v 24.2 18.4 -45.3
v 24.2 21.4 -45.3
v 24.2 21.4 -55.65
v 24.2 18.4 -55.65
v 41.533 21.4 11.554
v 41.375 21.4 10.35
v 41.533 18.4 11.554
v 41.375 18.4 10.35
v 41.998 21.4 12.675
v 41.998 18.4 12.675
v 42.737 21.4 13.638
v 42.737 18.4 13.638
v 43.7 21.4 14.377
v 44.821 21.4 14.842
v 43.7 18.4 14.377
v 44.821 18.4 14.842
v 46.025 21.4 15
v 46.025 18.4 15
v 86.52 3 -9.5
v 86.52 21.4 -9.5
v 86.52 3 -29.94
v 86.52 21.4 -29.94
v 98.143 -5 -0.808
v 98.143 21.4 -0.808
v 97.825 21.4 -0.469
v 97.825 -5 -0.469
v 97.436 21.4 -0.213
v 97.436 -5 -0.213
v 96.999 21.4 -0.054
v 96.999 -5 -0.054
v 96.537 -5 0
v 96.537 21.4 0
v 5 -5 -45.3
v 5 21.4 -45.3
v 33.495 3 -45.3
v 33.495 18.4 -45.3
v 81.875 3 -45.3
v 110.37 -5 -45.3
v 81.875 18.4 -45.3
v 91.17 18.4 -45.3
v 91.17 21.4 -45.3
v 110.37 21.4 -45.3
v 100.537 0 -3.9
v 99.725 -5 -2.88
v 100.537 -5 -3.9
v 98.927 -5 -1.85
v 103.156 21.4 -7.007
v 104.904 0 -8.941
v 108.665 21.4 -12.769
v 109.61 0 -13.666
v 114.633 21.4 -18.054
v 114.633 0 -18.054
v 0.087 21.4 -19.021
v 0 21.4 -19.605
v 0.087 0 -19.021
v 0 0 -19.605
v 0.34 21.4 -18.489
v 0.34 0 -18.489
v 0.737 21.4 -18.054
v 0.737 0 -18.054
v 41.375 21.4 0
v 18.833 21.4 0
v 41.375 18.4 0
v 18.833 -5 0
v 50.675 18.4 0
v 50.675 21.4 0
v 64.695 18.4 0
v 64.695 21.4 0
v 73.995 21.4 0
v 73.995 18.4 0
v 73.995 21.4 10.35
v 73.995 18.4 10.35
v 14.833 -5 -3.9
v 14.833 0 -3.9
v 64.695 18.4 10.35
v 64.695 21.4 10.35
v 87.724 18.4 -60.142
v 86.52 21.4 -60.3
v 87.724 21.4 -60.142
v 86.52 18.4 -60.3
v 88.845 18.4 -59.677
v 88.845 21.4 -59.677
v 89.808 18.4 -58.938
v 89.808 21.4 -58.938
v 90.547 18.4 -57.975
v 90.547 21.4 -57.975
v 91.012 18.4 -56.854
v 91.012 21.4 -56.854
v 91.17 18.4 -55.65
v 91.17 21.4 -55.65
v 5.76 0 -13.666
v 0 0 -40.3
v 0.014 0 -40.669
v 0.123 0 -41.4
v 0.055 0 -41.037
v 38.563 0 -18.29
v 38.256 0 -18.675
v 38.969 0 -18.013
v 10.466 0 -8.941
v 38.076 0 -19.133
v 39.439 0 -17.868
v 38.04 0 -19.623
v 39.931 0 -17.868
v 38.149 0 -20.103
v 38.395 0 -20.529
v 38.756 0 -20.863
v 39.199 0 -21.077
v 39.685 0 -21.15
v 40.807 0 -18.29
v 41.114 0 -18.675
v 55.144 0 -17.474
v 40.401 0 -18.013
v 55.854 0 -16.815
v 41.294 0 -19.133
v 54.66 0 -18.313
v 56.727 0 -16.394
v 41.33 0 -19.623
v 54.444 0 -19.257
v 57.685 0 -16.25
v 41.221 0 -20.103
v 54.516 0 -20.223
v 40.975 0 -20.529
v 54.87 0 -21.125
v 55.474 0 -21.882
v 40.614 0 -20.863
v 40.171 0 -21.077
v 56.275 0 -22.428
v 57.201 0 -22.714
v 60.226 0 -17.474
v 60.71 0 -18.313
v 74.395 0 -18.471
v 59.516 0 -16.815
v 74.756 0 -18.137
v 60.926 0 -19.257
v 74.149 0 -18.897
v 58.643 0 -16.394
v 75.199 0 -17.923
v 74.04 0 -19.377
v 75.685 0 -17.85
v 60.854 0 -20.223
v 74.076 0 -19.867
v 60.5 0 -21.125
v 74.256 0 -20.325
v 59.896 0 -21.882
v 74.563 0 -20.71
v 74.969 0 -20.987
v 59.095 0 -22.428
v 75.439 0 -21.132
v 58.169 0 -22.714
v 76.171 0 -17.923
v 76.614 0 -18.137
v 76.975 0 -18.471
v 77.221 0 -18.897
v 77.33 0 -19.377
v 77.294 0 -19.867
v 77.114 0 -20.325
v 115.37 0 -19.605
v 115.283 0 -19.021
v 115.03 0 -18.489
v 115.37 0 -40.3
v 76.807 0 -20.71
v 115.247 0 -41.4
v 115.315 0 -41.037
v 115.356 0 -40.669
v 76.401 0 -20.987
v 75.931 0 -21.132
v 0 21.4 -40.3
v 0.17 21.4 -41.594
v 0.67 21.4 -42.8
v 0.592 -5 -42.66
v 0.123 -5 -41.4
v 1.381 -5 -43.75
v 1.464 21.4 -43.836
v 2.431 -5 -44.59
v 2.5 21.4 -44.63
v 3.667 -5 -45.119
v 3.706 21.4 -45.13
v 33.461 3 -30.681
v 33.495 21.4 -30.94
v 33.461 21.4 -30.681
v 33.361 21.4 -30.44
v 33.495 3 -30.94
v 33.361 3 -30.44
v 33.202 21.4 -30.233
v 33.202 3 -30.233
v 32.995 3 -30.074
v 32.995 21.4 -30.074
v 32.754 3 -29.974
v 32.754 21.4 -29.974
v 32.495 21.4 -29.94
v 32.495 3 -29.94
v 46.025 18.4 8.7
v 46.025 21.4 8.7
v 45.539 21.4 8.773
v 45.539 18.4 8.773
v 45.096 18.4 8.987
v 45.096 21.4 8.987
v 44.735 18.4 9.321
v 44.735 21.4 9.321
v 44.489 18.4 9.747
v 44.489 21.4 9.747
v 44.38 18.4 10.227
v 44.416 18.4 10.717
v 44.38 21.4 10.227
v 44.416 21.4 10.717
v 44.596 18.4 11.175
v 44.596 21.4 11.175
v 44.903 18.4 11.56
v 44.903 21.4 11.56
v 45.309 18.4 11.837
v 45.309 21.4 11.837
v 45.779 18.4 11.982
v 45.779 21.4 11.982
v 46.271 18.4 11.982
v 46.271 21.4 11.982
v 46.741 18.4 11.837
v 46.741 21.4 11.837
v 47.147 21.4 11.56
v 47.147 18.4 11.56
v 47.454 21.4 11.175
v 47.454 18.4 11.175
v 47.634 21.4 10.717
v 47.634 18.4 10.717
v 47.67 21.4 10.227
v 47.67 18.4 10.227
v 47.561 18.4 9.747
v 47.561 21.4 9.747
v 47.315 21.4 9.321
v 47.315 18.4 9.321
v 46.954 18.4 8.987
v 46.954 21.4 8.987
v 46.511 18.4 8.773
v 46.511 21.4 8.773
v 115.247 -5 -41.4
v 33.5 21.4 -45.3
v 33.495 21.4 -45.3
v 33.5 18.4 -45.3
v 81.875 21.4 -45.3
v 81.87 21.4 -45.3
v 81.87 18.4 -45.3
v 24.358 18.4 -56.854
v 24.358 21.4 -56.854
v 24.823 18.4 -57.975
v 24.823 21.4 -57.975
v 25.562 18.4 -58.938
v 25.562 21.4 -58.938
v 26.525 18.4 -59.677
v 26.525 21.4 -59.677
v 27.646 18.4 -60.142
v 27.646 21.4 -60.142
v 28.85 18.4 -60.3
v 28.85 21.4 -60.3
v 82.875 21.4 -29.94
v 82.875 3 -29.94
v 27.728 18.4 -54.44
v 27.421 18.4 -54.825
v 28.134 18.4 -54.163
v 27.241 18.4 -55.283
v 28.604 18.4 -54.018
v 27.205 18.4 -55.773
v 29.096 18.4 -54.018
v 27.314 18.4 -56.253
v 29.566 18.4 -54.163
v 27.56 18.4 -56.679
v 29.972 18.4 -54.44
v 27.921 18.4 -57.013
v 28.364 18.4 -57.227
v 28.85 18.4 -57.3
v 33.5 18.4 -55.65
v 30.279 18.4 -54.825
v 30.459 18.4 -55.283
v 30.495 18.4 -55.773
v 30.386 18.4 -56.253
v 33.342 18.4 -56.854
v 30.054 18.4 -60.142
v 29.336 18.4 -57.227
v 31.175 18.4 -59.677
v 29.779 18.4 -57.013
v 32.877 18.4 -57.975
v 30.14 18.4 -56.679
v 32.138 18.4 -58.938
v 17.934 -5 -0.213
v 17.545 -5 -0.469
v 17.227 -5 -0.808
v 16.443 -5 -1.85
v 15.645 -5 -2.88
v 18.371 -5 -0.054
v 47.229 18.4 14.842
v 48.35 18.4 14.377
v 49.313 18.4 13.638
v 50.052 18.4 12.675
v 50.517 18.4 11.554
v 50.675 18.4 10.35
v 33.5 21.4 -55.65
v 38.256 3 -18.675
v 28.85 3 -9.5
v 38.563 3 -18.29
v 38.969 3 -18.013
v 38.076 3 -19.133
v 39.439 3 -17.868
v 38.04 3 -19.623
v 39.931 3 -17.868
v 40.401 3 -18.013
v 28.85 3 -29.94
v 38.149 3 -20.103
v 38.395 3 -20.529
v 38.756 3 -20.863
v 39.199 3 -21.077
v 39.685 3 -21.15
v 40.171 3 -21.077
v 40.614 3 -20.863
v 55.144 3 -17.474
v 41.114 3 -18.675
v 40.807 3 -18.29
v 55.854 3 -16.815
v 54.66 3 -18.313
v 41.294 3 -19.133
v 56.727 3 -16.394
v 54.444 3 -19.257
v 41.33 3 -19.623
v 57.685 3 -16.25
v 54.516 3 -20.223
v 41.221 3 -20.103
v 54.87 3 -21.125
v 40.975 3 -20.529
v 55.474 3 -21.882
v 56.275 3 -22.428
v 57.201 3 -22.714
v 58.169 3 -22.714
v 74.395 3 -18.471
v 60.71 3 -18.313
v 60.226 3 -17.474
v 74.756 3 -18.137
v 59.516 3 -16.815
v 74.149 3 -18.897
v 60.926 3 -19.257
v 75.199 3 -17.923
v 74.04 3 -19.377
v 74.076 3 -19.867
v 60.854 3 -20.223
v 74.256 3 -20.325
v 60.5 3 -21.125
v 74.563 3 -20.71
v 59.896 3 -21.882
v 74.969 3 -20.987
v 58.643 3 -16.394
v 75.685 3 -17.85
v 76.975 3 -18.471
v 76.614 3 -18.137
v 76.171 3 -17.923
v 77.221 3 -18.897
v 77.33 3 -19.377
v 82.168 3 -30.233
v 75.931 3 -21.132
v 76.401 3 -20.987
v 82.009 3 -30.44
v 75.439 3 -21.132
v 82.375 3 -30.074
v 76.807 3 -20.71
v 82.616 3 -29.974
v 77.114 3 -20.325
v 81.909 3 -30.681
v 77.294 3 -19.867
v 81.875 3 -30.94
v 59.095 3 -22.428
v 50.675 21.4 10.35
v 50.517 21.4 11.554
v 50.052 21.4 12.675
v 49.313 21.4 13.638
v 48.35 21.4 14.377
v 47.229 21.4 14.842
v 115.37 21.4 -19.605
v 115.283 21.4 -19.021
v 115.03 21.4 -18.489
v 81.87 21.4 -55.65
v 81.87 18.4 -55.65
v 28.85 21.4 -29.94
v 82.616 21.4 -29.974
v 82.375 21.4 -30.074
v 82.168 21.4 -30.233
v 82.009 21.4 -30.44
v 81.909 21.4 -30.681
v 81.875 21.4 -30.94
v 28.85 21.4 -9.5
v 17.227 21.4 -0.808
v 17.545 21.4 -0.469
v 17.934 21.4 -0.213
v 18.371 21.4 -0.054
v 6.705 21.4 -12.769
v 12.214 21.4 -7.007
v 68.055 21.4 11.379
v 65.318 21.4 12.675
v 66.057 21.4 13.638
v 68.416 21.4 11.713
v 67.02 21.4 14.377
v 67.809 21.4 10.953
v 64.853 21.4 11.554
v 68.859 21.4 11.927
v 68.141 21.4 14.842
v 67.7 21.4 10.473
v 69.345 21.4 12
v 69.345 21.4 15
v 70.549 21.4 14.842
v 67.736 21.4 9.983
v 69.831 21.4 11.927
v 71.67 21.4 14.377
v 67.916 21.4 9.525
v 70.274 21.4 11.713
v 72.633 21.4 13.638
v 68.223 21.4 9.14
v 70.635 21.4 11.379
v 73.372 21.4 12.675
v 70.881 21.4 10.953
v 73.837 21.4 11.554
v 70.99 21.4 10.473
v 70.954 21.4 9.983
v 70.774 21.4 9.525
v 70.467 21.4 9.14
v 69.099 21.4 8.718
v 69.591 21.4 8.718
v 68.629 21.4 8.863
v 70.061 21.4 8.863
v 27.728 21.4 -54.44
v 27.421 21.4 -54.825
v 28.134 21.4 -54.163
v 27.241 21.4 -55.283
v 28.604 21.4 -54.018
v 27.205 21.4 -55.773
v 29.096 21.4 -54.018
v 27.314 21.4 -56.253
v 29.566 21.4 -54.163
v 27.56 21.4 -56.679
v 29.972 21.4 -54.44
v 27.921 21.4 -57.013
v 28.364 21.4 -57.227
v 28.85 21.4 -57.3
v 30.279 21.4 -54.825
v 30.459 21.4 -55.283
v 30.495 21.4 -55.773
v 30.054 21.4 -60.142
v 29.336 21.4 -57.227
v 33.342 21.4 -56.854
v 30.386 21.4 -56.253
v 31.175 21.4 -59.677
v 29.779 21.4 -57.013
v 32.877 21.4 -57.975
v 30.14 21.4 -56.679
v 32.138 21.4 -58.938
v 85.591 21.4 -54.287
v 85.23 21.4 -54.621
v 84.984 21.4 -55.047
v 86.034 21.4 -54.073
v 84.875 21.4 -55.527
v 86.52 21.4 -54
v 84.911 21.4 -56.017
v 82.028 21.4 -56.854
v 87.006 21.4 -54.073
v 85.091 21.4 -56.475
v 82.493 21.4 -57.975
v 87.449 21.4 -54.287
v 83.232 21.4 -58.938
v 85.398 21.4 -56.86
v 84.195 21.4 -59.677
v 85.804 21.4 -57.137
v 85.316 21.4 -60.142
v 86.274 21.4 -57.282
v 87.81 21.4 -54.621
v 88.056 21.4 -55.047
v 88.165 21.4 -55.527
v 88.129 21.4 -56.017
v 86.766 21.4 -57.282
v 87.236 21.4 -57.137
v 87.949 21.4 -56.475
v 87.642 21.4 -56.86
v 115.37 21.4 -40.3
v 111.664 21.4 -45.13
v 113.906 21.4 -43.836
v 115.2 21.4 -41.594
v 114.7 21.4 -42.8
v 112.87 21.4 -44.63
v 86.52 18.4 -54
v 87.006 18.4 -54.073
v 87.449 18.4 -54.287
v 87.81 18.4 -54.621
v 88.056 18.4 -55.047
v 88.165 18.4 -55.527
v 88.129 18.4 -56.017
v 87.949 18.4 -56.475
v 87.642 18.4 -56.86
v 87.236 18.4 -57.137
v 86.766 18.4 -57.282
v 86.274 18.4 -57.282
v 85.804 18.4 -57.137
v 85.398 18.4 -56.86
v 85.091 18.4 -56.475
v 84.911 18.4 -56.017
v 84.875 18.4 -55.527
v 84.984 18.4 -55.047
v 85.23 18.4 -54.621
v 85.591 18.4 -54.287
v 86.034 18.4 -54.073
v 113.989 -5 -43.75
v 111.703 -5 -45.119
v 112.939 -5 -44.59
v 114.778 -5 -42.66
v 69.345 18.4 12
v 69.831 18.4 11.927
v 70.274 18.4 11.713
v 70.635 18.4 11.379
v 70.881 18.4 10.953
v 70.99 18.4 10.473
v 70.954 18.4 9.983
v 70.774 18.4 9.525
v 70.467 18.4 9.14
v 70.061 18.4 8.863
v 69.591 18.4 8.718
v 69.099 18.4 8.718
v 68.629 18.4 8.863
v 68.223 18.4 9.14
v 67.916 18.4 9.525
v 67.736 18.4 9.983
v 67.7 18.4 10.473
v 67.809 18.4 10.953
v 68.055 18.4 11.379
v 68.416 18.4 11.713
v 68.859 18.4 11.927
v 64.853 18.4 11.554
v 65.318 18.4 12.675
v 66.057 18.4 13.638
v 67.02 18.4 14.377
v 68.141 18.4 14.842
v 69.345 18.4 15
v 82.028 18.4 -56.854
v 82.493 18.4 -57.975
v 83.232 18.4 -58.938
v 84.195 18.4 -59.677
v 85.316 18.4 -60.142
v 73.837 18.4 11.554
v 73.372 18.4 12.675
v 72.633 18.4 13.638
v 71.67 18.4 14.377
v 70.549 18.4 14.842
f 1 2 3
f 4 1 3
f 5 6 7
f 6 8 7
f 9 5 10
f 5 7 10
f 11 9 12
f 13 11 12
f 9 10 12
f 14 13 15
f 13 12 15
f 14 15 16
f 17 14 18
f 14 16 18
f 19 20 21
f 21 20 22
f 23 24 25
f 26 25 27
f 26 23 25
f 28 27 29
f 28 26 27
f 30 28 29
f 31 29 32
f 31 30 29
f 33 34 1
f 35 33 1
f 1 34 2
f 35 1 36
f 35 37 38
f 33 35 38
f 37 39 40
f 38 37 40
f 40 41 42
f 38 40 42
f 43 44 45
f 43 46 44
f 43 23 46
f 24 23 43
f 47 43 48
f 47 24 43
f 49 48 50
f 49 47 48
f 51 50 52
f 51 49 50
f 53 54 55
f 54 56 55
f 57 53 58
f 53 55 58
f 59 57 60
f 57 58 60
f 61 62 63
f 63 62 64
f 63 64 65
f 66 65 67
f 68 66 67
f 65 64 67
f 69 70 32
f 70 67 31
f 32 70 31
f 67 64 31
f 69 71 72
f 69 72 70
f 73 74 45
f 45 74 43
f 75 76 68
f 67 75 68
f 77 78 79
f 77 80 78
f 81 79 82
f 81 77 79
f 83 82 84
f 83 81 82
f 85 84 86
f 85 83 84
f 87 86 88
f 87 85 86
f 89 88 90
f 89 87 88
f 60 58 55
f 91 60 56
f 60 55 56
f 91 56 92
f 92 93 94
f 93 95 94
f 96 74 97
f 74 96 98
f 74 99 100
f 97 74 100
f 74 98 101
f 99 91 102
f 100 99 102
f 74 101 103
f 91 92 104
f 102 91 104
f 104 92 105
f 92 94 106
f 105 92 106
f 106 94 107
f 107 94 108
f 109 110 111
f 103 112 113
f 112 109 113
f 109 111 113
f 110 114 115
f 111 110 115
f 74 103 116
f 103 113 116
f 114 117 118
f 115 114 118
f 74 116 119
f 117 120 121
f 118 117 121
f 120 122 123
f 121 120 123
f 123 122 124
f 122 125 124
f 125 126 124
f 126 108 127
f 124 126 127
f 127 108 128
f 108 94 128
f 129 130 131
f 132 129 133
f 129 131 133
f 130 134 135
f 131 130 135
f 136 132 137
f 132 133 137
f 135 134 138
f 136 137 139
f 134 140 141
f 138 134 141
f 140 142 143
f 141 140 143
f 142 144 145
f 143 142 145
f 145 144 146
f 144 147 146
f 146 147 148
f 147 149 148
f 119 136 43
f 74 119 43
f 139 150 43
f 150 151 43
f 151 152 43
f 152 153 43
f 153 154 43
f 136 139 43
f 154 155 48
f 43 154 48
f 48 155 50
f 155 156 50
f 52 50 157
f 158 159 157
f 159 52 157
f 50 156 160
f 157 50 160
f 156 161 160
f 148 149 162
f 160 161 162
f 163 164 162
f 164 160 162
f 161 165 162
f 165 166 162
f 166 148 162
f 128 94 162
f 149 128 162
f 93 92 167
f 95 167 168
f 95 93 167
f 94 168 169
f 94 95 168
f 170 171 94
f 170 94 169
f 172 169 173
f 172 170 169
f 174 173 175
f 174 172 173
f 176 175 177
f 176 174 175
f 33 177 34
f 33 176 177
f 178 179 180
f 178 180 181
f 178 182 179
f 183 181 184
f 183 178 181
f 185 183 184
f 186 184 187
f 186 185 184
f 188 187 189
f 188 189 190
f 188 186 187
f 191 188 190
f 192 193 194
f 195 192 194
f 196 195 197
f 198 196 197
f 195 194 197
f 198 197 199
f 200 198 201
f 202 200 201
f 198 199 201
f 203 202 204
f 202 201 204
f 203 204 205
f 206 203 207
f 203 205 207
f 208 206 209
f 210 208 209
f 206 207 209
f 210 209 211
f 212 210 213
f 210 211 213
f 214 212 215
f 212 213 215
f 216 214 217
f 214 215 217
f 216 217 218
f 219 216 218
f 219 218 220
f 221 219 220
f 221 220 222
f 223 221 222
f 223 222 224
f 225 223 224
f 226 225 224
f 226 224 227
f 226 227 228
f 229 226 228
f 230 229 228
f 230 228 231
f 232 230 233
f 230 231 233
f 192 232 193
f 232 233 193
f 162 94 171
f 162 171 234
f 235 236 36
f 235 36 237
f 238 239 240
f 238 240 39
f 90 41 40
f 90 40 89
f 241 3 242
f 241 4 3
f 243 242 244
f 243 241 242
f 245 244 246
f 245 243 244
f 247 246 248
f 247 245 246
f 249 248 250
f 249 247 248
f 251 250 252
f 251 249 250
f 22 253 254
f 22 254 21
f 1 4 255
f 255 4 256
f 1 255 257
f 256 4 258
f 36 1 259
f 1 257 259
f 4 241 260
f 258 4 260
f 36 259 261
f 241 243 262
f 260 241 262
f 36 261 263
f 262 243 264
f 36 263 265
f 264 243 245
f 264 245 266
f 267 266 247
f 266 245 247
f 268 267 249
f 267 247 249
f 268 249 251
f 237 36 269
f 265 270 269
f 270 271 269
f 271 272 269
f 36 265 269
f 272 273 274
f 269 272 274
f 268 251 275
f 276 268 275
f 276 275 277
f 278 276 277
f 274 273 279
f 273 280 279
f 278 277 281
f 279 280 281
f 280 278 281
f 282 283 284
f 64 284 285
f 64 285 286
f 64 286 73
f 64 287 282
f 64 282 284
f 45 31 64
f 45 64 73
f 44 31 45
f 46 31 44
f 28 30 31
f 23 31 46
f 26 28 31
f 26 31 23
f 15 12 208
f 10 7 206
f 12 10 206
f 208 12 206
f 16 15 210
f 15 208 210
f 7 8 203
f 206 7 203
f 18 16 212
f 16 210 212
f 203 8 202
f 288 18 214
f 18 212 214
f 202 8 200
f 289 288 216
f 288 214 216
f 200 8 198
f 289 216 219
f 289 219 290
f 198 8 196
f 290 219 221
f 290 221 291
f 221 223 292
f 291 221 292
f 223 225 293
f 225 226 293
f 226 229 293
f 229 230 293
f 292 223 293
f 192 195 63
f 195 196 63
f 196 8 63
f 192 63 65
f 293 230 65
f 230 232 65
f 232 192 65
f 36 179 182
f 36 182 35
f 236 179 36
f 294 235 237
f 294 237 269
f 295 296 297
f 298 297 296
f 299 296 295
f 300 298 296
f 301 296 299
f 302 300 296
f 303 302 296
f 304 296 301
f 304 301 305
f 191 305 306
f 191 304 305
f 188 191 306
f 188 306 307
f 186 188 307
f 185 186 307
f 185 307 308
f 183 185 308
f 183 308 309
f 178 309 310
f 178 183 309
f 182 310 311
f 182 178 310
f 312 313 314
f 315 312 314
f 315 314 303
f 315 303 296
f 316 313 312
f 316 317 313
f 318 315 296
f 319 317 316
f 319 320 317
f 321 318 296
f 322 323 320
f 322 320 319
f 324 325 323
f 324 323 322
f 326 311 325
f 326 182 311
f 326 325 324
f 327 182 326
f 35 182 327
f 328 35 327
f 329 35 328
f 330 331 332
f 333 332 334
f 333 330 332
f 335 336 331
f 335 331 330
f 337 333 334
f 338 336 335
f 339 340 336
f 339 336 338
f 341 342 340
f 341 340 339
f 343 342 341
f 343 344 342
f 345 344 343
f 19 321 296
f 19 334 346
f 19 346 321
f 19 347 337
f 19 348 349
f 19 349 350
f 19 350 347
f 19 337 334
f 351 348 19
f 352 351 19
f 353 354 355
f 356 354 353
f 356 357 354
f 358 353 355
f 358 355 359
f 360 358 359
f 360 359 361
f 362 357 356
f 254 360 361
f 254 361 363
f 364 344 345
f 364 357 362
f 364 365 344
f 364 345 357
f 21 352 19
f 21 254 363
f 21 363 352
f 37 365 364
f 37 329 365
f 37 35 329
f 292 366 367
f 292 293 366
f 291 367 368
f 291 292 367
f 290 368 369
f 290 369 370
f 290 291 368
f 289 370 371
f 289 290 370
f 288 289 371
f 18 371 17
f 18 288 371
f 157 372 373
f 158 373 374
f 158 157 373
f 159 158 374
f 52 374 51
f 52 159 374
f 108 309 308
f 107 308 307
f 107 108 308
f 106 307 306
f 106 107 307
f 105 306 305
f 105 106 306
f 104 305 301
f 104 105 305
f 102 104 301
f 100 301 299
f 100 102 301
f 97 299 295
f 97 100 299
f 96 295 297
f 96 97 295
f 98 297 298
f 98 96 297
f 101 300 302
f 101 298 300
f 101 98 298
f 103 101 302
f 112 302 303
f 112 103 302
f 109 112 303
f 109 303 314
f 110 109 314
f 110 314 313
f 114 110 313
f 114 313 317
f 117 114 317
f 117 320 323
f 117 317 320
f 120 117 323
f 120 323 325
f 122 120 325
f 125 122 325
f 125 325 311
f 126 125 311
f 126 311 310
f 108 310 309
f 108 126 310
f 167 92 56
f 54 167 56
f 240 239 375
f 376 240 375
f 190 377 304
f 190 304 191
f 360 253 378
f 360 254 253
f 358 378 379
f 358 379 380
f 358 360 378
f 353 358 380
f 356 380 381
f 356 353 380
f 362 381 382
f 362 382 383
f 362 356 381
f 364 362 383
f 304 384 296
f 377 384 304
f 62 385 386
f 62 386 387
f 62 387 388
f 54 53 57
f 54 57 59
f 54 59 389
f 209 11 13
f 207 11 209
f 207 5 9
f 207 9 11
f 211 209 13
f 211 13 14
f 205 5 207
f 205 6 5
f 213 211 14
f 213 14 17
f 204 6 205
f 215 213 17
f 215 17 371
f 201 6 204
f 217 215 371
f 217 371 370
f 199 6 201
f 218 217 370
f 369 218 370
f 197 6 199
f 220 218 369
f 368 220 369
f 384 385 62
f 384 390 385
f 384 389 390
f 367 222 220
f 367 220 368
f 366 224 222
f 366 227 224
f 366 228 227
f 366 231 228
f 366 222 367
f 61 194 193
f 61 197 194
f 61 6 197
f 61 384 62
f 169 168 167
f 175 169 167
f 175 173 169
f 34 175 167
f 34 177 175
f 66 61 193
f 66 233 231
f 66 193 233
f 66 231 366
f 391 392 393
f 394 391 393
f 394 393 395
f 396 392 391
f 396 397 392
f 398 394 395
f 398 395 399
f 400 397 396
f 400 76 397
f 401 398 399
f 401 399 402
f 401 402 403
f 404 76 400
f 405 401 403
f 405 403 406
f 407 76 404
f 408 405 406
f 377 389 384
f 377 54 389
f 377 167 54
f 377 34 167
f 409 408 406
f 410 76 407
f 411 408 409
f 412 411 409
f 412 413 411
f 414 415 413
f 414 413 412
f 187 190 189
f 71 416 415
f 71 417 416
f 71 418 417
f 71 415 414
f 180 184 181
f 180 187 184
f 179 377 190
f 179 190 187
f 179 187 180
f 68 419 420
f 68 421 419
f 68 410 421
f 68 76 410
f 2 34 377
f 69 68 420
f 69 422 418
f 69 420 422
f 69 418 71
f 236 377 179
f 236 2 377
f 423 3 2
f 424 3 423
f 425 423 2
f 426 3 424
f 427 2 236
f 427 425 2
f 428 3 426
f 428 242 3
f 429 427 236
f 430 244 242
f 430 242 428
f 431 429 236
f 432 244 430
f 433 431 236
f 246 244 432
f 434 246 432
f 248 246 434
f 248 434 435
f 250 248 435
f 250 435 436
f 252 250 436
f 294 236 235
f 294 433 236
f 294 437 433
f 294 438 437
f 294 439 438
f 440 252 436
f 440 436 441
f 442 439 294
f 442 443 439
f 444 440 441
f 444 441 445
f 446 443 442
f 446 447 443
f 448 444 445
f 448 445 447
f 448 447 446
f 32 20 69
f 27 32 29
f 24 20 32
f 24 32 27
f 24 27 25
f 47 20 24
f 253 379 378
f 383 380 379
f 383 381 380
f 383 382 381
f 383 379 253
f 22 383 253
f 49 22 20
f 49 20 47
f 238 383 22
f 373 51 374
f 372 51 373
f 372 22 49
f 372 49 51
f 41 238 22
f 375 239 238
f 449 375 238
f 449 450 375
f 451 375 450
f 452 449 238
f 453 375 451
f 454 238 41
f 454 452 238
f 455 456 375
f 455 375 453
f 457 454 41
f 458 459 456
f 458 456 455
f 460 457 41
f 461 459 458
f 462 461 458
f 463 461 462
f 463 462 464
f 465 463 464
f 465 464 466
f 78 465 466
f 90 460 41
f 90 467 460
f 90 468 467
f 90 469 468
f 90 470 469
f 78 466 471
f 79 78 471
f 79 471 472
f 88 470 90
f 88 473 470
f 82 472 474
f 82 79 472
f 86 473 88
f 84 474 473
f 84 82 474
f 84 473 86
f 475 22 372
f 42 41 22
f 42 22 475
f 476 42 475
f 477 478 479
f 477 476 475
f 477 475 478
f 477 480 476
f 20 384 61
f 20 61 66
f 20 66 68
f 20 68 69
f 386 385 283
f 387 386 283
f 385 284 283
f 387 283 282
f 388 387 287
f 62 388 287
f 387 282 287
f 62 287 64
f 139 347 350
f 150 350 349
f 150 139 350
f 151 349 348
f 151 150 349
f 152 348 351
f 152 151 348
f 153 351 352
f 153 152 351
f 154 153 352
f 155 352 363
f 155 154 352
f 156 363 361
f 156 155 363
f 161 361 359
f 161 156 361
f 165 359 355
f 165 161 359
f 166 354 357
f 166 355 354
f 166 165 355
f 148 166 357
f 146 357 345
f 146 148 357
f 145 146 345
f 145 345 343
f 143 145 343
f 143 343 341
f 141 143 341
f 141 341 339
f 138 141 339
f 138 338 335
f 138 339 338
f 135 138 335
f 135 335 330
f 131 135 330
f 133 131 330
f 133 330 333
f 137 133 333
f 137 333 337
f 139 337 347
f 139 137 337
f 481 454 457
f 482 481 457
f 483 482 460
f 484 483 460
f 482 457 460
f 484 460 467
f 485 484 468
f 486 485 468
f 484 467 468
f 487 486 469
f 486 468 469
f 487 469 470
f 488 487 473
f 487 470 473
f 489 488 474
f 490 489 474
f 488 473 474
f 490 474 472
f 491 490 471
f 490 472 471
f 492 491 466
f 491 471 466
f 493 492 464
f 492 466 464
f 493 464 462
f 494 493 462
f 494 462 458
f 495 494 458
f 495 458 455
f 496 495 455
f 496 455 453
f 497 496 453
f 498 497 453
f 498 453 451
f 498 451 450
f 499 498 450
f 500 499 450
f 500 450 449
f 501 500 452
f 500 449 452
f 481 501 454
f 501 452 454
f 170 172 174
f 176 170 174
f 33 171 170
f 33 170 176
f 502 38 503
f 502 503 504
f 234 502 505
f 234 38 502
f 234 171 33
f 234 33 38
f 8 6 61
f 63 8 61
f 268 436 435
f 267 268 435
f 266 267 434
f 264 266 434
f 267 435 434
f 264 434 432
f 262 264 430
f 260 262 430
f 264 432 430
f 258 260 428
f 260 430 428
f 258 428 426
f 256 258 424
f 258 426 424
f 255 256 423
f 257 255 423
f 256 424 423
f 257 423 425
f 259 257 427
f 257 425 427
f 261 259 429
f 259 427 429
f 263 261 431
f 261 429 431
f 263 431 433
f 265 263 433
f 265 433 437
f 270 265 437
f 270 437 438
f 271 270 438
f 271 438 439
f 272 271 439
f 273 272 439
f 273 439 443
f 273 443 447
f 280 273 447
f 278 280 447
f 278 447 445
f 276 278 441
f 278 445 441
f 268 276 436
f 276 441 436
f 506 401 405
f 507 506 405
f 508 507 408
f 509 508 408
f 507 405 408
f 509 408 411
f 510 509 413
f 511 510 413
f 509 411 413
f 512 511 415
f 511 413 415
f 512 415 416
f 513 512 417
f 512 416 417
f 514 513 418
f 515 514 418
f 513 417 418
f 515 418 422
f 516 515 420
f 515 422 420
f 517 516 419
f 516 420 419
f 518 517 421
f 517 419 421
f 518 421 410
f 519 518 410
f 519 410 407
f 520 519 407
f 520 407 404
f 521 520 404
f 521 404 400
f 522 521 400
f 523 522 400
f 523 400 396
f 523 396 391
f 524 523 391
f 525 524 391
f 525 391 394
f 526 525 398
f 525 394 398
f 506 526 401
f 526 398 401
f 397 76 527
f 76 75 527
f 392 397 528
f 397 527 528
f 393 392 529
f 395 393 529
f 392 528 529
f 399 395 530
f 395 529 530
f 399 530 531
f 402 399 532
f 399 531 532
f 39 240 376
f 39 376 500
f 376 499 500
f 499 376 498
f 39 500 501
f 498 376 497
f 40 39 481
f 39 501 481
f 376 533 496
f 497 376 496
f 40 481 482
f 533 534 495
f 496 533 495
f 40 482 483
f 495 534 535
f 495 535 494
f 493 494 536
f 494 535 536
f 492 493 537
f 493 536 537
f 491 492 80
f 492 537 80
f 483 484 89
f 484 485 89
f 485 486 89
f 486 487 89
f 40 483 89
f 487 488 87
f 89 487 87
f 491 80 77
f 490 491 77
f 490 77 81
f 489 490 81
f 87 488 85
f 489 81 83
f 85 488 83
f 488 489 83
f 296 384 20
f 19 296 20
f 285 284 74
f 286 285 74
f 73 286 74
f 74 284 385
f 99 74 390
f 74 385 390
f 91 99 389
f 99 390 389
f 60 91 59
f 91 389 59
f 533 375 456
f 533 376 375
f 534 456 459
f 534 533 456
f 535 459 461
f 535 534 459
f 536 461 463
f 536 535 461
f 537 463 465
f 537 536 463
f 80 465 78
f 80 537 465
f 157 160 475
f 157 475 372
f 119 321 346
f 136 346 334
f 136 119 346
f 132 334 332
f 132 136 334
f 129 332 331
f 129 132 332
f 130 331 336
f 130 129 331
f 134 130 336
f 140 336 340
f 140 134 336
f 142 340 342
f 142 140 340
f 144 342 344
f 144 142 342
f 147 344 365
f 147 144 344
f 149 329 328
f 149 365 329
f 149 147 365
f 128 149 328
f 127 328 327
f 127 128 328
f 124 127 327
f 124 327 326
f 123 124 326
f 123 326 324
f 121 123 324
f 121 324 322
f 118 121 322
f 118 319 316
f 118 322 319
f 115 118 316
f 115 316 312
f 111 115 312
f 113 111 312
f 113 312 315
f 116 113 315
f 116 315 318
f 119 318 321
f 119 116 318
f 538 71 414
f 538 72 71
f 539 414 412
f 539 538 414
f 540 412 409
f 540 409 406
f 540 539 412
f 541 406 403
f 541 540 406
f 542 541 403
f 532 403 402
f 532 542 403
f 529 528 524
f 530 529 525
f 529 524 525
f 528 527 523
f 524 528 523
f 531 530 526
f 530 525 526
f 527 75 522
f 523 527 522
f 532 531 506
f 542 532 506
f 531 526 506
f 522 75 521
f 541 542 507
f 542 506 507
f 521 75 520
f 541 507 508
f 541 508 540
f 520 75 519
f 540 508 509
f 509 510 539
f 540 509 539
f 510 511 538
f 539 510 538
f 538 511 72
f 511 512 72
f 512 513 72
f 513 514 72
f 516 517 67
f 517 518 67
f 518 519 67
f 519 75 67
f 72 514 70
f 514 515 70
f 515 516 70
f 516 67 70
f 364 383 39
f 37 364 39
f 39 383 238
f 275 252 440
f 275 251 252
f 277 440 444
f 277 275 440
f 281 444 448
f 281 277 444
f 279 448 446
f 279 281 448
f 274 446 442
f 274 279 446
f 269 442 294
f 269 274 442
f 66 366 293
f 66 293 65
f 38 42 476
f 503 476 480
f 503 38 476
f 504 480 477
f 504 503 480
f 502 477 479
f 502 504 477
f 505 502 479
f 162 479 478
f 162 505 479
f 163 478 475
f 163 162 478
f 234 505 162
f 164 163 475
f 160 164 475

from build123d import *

# Parameters (mm, degrees)
CROQUIS2_W              = 115.37
CROQUIS2_H              = 45.3
CROQUIS2_R              = 3.25
CROQUIS2_R_2            = 1.65
SALIENTE_EXTRUIR1_DEPTH = 21.4
CROQUIS6_W              = 48.38
CROQUIS6_H              = 35.8
CORTAR_EXTRUIR1_DEPTH   = 18.4
CROQUIS9_W              = 9.3
CROQUIS9_H              = 15
CROQUIS9_R              = 1.65
SALIENTE_EXTRUIR4_DEPTH = 3
REDONDEO8_R             = 4.65
CROQUIS7_W              = 115.37
CROQUIS7_H              = 3.9
SALIENTE_EXTRUIR3_DEPTH = 5
REDONDEO2_R             = 5
CORTAR_EXTRUIR2_DEPTH   = 133.828035068
REDONDEO9_R             = 2
CROQUIS12_W             = 57.67
CROQUIS12_H             = 20.44
CORTAR_EXTRUIR3_DEPTH   = 18.4
REDONDEO10_R            = 1


with BuildPart() as part:
    # Croquis2 → Saliente-Extruir1 (new body)
    with BuildSketch(Plane(origin=(0, 0, 0), x_dir=(1, 0, 0), z_dir=(0, 1, 0))):
        with Locations((57.685, 22.65)):
            Rectangle(CROQUIS2_W, CROQUIS2_H)
        with Locations(Location((57.685, 19.5, 0), (0, 0, 270))):
            Circle(CROQUIS2_R, mode=Mode.SUBTRACT)
        with Locations(Location((75.685, 19.5, 0), (0, 0, 270))):
            Circle(CROQUIS2_R_2, mode=Mode.SUBTRACT)
        with Locations(Location((39.685, 19.5, 0), (0, 0, 90))):
            Circle(CROQUIS2_R_2, mode=Mode.SUBTRACT)
    extrude(amount=SALIENTE_EXTRUIR1_DEPTH)

    # Croquis6 → Cortar-Extruir1 (cut)
    with BuildSketch(Plane(origin=(0, 21.4, 0), x_dir=(1, 0, 0), z_dir=(0, 1, 0))):
        with Locations((57.685, 27.4)):
            Rectangle(CROQUIS6_W, CROQUIS6_H)
    extrude(amount=-CORTAR_EXTRUIR1_DEPTH, mode=Mode.SUBTRACT)

    # Croquis9 → Saliente-Extruir4 (add)
    # profile 1 of 4: a face of its own
    with BuildSketch(Plane(origin=(0, 21.4, 0), x_dir=(1, 0, 0), z_dir=(0, 1, 0))):
        with Locations((86.52, 52.8)):
            Rectangle(CROQUIS9_W, CROQUIS9_H)
        with Locations(Location((86.52, 55.65, 0), (0, 0, 270))):
            Circle(CROQUIS9_R, mode=Mode.SUBTRACT)
    # profile 2 of 4: a face of its own
    with BuildSketch(Plane(origin=(0, 21.4, 0), x_dir=(1, 0, 0), z_dir=(0, 1, 0))):
        with Locations((28.85, 52.8)):
            Rectangle(CROQUIS9_W, CROQUIS9_H)
        with Locations(Location((28.85, 55.65, 0), (0, 0, 90))):
            Circle(CROQUIS9_R, mode=Mode.SUBTRACT)
    # profile 3 of 4: a face of its own
    with BuildSketch(Plane(origin=(0, 21.4, 0), x_dir=(1, 0, 0), z_dir=(0, 1, 0))):
        with Locations((69.345, -7.5)):
            Rectangle(CROQUIS9_W, CROQUIS9_H)
        with Locations(Location((69.345, -10.35, 0), (0, 0, 270))):
            Circle(CROQUIS9_R, mode=Mode.SUBTRACT)
    # profile 4 of 4: a face of its own
    with BuildSketch(Plane(origin=(0, 21.4, 0), x_dir=(1, 0, 0), z_dir=(0, 1, 0))):
        with Locations((46.025, -7.5)):
            Rectangle(CROQUIS9_W, CROQUIS9_H)
        with Locations(Location((46.025, -10.35, 0), (0, 0, 90))):
            Circle(CROQUIS9_R, mode=Mode.SUBTRACT)
    extrude(amount=-SALIENTE_EXTRUIR4_DEPTH)

    # Redondeo8
    redondeo8_edges = [part.edges().sort_by_distance(p)[0] for p in [
        (73.995, 19.9, 15),
        (64.695, 19.9, 15),
        (41.375, 19.9, 15),
        (50.675, 19.9, 15),
        (91.17, 19.9, -60.3),
        (81.87, 19.9, -60.3),
        (33.5, 19.9, -60.3),
        (24.2, 19.9, -60.3),
    ]]
    fillet(redondeo8_edges, radius=REDONDEO8_R - 0.0001)  # a hair under: the kernel refuses the full size

    # Croquis7 → Saliente-Extruir3 (add)
    with BuildSketch(Plane.XZ):
        with Locations((57.685, -43.35)):
            Rectangle(CROQUIS7_W, CROQUIS7_H)
        with Locations((57.685, -1.95)):
            Rectangle(CROQUIS7_W, CROQUIS7_H)
    extrude(amount=SALIENTE_EXTRUIR3_DEPTH)

    # Redondeo2
    redondeo2_edges = [part.edges().sort_by_distance(p)[0] for p in [
        (0, 8.2, 0),
        (0, 8.2, -45.3),
        (115.37, 8.2, -45.3),
        (115.37, 8.2, 0),
    ]]
    fillet(redondeo2_edges, radius=REDONDEO2_R)

    # Croquis11 → Cortar-Extruir2 (cut, through all)
    with BuildSketch(Plane(origin=(0, 21.4, 0), x_dir=(1, 0, 0), z_dir=(0, 1, 0))):
        with BuildLine():
            Line((115.37, 18.647739407), (115.37, 5))
            ThreePointArc((115.37, 5), (113.905533906, 1.464466094), (110.37, 0))
            Line((110.37, 0), (97.550134045, 0))
            ThreePointArc((97.550134045, 0), (105.831202258, 9.924815779), (115.37, 18.647739407))
        make_face()
        with BuildLine():
            Line((0, 18.647739407), (0, 5))
            ThreePointArc((0, 5), (1.464466094, 1.464466094), (5, 0))
            Line((5, 0), (17.819865955, 0))
            ThreePointArc((17.819865955, 0), (9.538797742, 9.924815779), (0, 18.647739407))
        make_face()
    extrude(amount=-CORTAR_EXTRUIR2_DEPTH, mode=Mode.SUBTRACT)

    # Redondeo9
    redondeo9_edges = [part.edges().sort_by_distance(p)[0] for p in [
        (97.550134045, 8.2, 0),
        (115.37, 10.7, -18.647739407),
        (0, 10.7, -18.647739407),
        (17.819865955, 8.2, 0),
    ]]
    fillet(redondeo9_edges, radius=REDONDEO9_R)

    # Croquis12 → Cortar-Extruir3 (cut)
    with BuildSketch(Plane(origin=(0, 21.4, 0), x_dir=(1, 0, 0), z_dir=(0, 1, 0))):
        with Locations((57.685, 19.72)):
            Rectangle(CROQUIS12_W, CROQUIS12_H)
    extrude(amount=-CORTAR_EXTRUIR3_DEPTH, mode=Mode.SUBTRACT)

    # Redondeo10
    redondeo10_edges = [part.edges().sort_by_distance(p)[0] for p in [
        (33.495, 12.2, -29.94),
        (81.875, 12.2, -29.94),
    ]]
    fillet(redondeo10_edges, radius=REDONDEO10_R)


solid = part.part
